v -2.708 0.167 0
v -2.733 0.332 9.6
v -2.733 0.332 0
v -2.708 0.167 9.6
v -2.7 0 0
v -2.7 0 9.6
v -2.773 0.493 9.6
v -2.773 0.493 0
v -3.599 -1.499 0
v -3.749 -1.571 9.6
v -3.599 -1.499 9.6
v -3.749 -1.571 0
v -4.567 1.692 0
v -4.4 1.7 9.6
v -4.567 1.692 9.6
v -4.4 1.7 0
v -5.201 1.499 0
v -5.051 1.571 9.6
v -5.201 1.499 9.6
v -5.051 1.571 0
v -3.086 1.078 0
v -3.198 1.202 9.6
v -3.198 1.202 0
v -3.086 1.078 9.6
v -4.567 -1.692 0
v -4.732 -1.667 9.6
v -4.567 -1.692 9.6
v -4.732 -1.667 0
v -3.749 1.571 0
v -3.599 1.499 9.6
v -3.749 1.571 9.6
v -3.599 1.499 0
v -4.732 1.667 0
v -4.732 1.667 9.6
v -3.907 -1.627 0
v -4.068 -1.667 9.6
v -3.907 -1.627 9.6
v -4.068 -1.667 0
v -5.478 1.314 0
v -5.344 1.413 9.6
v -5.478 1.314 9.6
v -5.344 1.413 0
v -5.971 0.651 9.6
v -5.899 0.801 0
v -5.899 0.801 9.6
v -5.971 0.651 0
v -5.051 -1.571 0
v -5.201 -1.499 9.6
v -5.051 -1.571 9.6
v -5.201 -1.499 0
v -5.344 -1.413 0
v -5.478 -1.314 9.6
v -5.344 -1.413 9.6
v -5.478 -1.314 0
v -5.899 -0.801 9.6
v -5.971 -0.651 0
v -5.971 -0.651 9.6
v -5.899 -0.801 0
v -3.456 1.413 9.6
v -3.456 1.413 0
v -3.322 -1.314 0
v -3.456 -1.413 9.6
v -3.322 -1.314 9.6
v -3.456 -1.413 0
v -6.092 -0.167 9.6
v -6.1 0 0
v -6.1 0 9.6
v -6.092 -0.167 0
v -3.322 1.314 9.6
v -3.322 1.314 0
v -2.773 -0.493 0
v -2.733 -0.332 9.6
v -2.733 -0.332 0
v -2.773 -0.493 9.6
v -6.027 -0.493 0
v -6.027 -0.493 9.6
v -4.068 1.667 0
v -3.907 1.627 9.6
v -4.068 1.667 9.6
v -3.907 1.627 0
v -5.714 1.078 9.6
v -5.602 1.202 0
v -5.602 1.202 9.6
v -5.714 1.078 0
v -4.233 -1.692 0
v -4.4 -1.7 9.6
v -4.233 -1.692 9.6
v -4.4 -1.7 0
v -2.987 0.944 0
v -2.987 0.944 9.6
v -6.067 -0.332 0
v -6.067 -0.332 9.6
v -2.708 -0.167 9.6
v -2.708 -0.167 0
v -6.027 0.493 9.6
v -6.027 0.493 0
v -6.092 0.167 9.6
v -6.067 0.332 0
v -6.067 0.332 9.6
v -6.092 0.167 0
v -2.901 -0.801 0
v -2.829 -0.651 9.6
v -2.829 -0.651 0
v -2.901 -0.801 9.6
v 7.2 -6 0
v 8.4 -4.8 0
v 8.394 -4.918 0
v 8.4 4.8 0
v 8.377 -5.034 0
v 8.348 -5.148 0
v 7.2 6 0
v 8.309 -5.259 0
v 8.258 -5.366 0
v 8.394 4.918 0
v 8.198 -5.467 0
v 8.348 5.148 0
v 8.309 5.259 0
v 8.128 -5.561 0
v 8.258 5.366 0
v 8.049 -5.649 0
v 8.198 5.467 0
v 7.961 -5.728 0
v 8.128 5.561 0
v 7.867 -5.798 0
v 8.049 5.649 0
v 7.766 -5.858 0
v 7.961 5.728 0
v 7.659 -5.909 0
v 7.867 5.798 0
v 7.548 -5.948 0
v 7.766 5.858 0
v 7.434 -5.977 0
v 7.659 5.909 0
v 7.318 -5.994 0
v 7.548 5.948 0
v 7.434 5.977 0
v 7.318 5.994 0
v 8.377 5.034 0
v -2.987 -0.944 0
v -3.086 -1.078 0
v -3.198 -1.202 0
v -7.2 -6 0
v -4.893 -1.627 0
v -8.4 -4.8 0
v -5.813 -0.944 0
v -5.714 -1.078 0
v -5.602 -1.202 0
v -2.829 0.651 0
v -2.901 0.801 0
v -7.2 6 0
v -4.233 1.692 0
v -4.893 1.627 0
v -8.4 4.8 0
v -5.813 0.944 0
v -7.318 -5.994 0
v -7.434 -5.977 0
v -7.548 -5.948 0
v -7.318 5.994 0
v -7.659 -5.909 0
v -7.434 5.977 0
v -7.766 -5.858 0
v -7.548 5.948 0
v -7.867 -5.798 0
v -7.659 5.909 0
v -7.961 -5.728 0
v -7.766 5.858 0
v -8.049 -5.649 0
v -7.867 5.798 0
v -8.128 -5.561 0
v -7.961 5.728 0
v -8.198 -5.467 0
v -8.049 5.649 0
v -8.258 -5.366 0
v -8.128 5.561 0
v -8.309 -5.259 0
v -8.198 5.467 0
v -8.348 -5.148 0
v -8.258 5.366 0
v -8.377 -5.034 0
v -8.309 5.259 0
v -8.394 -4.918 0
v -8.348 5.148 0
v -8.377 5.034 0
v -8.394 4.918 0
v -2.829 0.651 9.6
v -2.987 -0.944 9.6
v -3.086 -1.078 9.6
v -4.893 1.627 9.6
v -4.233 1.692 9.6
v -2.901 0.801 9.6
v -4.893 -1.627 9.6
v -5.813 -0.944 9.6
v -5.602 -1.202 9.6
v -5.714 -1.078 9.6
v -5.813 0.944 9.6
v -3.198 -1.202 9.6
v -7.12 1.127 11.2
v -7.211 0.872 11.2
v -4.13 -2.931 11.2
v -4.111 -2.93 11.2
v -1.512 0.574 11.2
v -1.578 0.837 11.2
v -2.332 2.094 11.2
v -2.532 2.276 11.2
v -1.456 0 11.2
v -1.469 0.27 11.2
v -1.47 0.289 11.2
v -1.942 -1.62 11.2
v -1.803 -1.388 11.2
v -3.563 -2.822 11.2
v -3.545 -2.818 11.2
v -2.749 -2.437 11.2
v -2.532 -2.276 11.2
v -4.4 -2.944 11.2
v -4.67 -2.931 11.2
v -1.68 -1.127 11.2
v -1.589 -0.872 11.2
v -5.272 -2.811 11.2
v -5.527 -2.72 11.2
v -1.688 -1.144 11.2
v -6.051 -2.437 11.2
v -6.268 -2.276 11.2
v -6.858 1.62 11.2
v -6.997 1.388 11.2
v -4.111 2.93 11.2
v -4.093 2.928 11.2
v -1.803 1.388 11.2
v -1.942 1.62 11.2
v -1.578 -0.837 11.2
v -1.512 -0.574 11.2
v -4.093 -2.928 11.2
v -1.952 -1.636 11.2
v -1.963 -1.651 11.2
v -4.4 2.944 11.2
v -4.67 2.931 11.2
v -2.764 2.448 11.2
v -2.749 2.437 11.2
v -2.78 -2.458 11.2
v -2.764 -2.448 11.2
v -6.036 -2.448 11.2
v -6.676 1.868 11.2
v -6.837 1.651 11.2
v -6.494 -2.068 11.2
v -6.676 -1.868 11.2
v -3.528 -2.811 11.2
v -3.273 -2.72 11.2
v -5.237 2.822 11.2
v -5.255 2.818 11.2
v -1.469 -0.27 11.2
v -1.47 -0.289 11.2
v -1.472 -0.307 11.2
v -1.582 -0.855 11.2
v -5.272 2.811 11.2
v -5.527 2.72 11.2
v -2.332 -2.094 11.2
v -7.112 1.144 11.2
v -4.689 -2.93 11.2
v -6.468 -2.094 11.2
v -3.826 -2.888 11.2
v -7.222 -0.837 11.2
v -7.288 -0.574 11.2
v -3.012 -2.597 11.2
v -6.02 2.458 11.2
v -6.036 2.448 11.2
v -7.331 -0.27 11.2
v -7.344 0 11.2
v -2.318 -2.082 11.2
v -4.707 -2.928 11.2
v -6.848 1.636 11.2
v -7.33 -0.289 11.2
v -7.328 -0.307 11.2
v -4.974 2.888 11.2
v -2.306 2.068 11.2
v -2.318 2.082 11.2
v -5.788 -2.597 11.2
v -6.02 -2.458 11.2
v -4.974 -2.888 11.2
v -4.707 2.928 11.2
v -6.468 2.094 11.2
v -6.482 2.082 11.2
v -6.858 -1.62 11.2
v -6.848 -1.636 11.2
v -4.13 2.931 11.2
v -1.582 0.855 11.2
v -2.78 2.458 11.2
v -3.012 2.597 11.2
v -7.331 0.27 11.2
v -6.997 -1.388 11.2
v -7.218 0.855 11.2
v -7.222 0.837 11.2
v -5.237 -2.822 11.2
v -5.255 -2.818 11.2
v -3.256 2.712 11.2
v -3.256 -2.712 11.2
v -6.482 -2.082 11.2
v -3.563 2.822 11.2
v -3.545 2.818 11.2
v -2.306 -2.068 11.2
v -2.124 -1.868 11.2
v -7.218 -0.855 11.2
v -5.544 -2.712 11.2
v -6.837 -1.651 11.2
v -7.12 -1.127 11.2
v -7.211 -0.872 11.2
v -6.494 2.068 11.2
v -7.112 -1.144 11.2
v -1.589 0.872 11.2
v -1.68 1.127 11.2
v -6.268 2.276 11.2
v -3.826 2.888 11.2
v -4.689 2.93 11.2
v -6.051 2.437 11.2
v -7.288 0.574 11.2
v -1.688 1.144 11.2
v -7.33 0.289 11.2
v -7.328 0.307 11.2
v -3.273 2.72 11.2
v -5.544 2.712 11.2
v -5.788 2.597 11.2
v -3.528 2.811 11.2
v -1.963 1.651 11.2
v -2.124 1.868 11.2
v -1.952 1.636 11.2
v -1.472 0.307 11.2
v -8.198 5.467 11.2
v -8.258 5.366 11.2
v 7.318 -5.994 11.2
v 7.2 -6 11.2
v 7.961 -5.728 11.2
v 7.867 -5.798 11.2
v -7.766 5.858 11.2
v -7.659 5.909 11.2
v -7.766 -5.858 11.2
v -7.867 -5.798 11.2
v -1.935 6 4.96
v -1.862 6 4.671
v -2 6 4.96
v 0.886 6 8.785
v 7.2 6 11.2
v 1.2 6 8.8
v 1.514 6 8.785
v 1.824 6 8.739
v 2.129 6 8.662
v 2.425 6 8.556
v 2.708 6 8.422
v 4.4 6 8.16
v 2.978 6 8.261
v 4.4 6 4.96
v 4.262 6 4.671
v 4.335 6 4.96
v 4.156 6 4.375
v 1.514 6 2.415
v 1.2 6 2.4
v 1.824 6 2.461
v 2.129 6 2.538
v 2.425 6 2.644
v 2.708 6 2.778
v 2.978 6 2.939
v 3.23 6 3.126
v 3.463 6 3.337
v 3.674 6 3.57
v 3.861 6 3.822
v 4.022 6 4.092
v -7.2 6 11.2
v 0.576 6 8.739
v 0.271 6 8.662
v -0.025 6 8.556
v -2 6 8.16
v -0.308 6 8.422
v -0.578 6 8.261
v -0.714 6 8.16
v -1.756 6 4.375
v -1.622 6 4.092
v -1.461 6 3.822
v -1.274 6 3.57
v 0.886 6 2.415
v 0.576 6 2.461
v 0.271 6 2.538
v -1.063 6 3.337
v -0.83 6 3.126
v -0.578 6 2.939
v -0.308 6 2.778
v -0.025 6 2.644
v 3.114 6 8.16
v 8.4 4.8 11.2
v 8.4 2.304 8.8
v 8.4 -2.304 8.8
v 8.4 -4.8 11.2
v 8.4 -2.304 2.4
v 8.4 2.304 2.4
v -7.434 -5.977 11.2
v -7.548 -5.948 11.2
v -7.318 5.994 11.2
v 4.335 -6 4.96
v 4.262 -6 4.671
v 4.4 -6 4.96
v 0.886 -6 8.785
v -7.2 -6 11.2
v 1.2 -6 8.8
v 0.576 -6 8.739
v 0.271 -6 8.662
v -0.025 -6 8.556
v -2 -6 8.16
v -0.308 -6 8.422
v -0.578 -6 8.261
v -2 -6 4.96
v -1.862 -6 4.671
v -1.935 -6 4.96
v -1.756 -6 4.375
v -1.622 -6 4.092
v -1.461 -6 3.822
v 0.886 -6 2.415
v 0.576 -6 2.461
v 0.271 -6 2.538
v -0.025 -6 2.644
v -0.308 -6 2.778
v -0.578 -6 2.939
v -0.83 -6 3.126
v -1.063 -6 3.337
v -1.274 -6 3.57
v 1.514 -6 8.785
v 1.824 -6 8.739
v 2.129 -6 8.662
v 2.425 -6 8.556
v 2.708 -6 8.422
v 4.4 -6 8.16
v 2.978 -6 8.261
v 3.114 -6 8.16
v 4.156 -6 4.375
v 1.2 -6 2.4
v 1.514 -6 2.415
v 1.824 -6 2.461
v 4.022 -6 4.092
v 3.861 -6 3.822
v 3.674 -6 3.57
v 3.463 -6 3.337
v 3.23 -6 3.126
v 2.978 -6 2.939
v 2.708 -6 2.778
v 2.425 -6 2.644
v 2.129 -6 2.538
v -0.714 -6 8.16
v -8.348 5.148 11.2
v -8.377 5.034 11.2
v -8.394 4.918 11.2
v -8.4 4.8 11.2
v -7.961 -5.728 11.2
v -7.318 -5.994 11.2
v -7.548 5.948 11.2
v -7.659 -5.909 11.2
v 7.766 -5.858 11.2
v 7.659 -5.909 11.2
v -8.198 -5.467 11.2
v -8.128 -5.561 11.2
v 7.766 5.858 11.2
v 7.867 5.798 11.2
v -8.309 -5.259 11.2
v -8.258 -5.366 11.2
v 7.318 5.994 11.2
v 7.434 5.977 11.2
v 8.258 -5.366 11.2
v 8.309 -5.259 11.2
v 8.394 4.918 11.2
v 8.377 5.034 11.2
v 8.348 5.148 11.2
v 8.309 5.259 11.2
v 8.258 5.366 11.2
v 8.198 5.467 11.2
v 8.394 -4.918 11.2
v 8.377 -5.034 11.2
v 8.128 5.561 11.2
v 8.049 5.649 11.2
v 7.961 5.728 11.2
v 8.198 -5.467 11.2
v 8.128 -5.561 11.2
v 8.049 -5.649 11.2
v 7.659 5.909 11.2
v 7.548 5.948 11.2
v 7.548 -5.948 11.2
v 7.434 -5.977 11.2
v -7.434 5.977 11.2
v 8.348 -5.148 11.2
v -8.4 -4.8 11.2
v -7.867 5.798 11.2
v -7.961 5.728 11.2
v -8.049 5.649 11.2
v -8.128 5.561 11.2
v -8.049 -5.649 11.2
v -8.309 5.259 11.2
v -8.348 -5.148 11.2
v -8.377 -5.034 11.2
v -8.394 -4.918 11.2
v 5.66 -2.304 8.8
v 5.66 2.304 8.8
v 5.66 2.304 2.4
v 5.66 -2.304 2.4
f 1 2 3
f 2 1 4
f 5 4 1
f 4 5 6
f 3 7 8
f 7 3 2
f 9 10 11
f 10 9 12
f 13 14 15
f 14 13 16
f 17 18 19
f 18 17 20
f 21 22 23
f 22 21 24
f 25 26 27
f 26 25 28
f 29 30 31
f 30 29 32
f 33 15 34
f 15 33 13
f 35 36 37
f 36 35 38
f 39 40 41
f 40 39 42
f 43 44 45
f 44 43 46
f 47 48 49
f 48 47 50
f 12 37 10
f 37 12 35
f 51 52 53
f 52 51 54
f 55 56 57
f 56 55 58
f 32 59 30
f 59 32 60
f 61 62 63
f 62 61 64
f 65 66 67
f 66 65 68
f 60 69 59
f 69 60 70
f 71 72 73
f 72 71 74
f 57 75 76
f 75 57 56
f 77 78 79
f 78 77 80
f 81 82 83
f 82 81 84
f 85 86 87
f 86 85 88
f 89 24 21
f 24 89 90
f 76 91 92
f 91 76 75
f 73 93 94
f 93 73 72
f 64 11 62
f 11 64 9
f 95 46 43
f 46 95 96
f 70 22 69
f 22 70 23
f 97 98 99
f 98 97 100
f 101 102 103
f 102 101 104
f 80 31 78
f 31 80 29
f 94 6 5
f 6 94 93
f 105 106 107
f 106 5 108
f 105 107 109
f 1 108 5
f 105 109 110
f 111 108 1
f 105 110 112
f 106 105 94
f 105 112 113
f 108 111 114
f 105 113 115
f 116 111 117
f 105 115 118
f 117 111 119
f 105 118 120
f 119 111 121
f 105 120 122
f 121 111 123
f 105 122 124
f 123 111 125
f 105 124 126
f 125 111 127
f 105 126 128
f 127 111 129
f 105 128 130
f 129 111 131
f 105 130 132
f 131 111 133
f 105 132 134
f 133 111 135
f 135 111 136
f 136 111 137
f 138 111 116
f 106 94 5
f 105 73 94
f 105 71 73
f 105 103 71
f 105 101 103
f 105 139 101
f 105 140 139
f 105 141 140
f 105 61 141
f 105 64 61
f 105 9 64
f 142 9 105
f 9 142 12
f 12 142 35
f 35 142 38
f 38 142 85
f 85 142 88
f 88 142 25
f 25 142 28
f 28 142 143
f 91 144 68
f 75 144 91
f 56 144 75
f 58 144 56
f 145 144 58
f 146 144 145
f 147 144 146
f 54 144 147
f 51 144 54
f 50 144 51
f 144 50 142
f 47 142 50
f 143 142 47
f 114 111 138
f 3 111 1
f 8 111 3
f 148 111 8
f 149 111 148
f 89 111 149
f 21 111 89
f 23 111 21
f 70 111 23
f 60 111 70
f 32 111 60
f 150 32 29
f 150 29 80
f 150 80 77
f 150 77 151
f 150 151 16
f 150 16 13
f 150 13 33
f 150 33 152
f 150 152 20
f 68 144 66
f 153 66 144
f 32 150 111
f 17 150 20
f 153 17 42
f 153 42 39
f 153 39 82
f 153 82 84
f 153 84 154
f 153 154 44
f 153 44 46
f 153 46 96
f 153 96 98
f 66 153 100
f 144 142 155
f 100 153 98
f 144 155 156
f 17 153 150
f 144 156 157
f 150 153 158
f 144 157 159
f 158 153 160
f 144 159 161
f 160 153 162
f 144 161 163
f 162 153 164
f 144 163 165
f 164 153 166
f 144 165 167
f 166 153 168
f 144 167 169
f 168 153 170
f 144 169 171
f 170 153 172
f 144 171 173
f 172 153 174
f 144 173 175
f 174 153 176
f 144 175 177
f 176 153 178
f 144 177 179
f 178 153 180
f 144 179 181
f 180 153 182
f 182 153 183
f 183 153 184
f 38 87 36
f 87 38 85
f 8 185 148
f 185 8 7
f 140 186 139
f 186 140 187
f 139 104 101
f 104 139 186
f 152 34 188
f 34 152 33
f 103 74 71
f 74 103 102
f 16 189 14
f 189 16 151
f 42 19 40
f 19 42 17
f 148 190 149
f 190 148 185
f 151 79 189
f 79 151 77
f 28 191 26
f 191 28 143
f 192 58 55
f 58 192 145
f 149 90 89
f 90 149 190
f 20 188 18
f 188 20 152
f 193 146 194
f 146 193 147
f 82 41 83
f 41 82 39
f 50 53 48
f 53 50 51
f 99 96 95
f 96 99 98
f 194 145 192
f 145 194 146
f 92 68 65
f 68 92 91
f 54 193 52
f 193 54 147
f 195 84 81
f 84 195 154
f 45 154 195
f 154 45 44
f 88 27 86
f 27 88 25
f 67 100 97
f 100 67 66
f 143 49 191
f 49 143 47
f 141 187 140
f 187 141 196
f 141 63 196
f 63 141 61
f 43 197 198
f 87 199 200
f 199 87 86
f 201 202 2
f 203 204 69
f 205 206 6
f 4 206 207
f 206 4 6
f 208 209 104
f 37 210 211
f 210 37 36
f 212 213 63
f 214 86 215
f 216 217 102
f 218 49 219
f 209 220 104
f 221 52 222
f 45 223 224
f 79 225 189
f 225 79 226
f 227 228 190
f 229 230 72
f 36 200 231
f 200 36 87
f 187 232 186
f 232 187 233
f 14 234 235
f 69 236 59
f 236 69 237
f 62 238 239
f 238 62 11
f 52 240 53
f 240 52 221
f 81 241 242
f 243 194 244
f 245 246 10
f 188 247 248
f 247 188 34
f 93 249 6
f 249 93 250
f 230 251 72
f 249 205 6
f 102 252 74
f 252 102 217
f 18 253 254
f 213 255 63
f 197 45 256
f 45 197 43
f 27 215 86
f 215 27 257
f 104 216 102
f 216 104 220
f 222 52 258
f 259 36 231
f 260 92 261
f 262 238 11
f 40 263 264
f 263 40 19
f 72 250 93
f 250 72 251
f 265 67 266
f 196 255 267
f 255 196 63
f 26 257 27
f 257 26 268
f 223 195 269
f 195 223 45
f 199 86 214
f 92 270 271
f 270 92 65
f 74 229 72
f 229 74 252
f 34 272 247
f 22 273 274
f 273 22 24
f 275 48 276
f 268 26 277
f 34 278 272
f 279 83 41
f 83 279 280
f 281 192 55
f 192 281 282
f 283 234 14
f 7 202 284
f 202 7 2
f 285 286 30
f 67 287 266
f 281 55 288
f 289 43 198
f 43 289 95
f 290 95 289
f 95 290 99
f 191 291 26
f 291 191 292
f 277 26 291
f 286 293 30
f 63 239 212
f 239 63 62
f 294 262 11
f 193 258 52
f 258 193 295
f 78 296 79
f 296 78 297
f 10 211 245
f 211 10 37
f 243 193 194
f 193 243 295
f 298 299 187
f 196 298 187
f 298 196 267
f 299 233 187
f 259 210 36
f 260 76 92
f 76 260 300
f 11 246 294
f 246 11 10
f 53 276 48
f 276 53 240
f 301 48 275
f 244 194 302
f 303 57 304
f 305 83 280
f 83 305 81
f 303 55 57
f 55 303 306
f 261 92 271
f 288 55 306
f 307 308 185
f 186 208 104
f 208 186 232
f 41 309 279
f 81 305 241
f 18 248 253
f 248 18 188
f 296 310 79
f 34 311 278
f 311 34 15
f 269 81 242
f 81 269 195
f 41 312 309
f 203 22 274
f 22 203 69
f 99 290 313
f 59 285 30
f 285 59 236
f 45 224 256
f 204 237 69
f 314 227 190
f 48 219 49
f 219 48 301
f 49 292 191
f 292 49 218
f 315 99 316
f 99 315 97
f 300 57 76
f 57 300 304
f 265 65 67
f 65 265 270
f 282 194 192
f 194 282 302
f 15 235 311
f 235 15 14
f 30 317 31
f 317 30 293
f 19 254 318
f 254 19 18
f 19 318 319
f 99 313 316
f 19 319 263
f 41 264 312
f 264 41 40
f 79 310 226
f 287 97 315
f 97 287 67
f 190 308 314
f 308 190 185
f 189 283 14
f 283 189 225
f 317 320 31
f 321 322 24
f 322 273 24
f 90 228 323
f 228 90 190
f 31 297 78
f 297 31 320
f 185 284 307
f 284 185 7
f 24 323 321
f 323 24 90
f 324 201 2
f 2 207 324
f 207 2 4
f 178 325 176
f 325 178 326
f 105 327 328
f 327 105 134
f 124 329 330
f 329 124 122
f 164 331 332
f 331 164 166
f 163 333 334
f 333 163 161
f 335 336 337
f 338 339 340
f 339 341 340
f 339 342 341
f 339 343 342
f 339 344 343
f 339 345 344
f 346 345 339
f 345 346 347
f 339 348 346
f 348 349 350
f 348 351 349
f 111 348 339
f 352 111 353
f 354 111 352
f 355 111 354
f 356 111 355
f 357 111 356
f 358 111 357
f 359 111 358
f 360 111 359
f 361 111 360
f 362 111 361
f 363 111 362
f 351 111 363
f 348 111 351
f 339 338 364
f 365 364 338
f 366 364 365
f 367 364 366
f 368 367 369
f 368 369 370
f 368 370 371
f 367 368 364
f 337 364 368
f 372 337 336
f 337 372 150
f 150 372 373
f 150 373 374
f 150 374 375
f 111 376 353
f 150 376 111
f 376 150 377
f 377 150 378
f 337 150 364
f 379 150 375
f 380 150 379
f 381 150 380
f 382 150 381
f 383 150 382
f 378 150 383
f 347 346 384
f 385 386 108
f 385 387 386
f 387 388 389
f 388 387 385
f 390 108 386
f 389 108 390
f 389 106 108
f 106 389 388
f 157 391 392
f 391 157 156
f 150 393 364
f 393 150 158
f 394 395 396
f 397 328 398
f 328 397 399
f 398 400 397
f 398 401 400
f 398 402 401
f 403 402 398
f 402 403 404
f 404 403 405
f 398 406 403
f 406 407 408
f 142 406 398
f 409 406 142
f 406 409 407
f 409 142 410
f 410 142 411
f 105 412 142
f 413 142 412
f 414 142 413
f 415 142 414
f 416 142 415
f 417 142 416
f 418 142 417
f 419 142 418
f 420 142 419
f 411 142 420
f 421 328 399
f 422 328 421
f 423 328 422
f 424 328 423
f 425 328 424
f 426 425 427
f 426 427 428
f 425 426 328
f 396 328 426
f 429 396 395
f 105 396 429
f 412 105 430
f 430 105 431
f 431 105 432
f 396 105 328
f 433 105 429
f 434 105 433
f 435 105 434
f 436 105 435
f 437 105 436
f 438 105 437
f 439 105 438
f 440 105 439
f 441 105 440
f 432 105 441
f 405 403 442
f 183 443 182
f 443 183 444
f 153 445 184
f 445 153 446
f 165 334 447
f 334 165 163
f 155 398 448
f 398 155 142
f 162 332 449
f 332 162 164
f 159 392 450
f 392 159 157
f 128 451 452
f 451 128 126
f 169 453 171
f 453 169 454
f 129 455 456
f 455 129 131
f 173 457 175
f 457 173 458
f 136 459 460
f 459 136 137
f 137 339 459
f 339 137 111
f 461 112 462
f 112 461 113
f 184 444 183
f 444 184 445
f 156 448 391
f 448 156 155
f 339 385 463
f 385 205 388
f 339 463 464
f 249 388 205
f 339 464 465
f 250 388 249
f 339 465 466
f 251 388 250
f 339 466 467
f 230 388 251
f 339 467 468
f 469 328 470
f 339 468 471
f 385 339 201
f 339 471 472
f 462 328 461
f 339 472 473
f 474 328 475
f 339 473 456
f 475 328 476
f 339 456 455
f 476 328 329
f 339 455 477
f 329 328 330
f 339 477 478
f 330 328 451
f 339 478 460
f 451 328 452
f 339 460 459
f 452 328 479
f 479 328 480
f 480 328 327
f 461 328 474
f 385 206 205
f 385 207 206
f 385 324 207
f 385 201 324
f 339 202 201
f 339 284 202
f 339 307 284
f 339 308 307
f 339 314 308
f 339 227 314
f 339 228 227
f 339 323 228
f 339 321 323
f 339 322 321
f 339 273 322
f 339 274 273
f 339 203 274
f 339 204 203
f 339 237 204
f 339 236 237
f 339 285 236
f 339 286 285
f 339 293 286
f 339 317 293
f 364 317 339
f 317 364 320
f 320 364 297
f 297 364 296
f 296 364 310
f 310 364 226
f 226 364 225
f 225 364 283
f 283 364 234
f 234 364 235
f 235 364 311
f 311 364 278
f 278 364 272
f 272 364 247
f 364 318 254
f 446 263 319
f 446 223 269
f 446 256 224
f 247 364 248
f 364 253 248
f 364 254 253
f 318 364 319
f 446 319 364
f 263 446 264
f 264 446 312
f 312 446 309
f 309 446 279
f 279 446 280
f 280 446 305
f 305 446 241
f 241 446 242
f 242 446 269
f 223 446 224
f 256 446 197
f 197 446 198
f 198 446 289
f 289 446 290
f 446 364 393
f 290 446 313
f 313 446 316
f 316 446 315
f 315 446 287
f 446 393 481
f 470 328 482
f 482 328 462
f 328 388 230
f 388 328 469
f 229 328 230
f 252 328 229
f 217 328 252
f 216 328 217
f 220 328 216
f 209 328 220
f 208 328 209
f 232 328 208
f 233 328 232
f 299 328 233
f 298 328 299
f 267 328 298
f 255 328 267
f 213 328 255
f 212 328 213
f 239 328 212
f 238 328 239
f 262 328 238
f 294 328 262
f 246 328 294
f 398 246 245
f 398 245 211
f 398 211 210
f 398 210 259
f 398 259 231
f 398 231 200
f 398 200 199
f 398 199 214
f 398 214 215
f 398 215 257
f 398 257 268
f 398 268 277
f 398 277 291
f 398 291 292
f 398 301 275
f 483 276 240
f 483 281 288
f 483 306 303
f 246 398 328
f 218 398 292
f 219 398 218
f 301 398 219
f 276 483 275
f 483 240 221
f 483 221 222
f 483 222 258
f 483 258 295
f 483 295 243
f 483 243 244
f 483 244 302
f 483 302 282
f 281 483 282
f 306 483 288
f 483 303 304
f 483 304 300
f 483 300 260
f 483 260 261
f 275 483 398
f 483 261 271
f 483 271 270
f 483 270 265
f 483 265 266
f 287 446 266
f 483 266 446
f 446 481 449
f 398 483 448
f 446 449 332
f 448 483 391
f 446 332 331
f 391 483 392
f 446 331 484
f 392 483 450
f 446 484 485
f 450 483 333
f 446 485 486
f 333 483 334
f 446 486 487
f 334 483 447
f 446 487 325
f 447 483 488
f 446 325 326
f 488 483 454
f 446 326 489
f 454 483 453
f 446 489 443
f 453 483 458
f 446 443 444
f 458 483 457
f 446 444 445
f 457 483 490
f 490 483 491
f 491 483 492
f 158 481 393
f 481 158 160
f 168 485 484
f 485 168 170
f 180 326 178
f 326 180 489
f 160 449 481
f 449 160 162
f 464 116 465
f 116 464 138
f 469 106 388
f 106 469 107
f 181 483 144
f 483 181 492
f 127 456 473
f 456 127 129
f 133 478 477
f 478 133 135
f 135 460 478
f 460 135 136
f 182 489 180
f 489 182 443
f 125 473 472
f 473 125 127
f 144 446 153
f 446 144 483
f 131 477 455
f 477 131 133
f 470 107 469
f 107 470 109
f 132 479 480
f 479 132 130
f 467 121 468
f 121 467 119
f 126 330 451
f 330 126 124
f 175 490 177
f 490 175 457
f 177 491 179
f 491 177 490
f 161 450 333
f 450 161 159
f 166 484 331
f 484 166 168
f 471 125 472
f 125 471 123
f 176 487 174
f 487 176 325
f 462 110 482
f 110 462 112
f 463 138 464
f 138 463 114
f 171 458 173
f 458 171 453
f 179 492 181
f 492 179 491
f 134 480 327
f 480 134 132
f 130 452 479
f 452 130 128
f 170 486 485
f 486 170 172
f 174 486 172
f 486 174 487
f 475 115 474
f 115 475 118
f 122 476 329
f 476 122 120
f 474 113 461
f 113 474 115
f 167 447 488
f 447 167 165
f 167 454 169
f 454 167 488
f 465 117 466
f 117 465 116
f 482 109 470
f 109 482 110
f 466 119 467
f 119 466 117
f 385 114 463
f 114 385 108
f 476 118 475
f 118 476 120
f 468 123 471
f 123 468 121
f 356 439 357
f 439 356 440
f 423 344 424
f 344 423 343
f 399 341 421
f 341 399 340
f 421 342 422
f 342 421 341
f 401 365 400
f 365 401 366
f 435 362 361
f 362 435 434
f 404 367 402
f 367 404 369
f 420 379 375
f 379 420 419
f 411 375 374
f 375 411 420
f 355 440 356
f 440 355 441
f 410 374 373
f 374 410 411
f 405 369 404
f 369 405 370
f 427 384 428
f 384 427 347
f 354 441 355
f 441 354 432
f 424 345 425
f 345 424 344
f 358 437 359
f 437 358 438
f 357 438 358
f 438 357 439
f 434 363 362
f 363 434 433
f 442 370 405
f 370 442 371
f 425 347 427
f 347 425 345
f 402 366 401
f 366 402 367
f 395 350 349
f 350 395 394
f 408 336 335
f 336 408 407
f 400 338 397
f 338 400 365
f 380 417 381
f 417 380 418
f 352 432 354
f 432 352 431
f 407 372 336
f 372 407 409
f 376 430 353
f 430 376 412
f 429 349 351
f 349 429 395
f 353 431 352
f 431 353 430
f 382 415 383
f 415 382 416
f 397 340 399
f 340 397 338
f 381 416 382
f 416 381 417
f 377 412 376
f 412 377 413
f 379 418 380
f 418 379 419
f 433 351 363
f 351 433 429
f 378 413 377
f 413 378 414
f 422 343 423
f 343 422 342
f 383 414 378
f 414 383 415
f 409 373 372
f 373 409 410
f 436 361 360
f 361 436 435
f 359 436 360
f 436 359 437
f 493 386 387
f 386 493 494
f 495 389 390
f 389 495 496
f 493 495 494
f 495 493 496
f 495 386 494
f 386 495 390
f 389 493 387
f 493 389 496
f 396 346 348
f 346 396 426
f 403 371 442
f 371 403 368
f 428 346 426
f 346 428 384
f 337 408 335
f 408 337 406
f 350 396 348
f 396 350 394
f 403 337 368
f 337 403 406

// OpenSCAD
// file: ../lib/fdm.scad
// Shared FDM-friendly helpers for OpensCAD parts.
// Include from parts with: include <../lib/fdm.scad>;

// Default mesh density when a caller does not pass fragments=.
default_fragments = 48;
// Tiny overshoot used only inside helper boolean cleanup (not a part dimension).
helper_epsilon    = 0.01;

// Rounded rectangle extruded along Z (2D fillet → manifold solid).
module rounded_rect(size, radius, center = true) {
    w = size[0];
    h = size[1];
    r = min(radius, min(w, h) / 2);
    offset(r = r)
        offset(delta = -r)
            square([w, h], center = center);
}

module rounded_box(size, radius, center = true) {
    linear_extrude(height = size[2], center = center)
        rounded_rect([size[0], size[1]], radius, center = true);
}

// Cylinder with optional countersink (flat-head screw seat).
module countersunk_hole(d, h, cs_d = undef, cs_h = undef, center = false, fragments = undef) {
    fn = is_undef(fragments) ? default_fragments : fragments;
    cd = is_undef(cs_d) ? d * 2 : cs_d;
    ch = is_undef(cs_h) ? (cd - d) / 2 : cs_h;
    union() {
        cylinder(d = d, h = h, center = center, $fn = fn);
        translate([0, 0, center ? h / 2 - ch : h - ch])
            cylinder(d1 = d, d2 = cd, h = ch, center = false, $fn = fn);
    }
}

// Simple through-hole.
module mounting_hole(d, h, center = false, fragments = undef) {
    fn = is_undef(fragments) ? default_fragments : fragments;
    cylinder(d = d, h = h, center = center, $fn = fn);
}

// Fillet along +Z edge of a cube corner (positive volume).
// Prefer 2D offset fillets on extruded profiles for reliable manifolds.
module cylinder_fillet(r, h, fragments = undef) {
    fn = is_undef(fragments) ? default_fragments : fragments;
    eps = helper_epsilon;
    difference() {
        translate([-eps, -eps, 0])
            cube([r + eps, r + eps, h]);
        translate([r, r, -eps])
            cylinder(r = r, h = h + 2 * eps, $fn = fn);
    }
}
// main file
// Desk cable clip — mounts with a single screw, clips cables of set diameter.
// Customizer: Window → Customizer, tweak groups below, F5 to preview.

include <../lib/fdm.scad>;

/* [Cable] */
cable_d         = 6.0;  // mm — cable outer diameter
cable_clearance = 0.4;  // mm — extra gap so cable snaps in easily

/* [Body] */
wall       = 2.4;   // mm — ~3× nozzle; keep ≥ 2× nozzle
width      = 12.0;  // mm — clip width along cable
base_extra = 8.0;   // mm — material beyond clip for screw mount
fillet     = 1.2;   // mm — outer corner radius

/* [Clamp] */
throat_ratio        = 0.72;  // fraction of opening width at the snap mouth
channel_flat_lift   = 0.15;  // fraction of opening — flat cut above center
channel_flat_height = 0.50;  // fraction of opening — flat cut height
throat_x_inset_frac = 0.10;  // fraction of wall — throat inset from +X face

/* [Mount] */
screw_d    = 3.4;  // mm — clearance for M3 (loose)
screw_cs_d = 6.2;  // mm — countersink outer diameter
screw_cs_h = 1.8;  // mm — countersink depth

/* [Print] */
nozzle       = 0.4;  // mm — informational; prefer wall = n × nozzle
fragments    = 64;   // [24:8:128] circle resolution ($fn)
bool_epsilon = 0.2;  // mm — through-cut overshoot

/* [Hidden] */
opening = cable_d + cable_clearance;
body_h  = opening + 2 * wall;
body_l  = opening + wall + base_extra;
throat  = opening * throat_ratio;
$fn     = fragments;

module cable_clip() {
    difference() {
        translate([0, 0, body_h / 2])
            rounded_box([body_l, width, body_h], fillet, center = true);

        translate([wall / 2, 0, wall + opening / 2])
            rotate([90, 0, 0])
                cylinder(d = opening, h = width + bool_epsilon, center = true);

        translate([body_l / 2 - wall * throat_x_inset_frac, 0, wall + opening / 2])
            cube([wall * 2 + bool_epsilon, throat, opening], center = true);

        translate([wall / 2, 0, wall + opening / 2 + opening * channel_flat_lift])
            cube(
                [opening, width + bool_epsilon, opening * channel_flat_height],
                center = true
            );

        translate([-body_l / 2 + base_extra / 2, 0, 0])
            countersunk_hole(
                screw_d,
                body_h + bool_epsilon,
                screw_cs_d,
                screw_cs_h,
                fragments = fragments
            );
    }
}

cable_clip();
